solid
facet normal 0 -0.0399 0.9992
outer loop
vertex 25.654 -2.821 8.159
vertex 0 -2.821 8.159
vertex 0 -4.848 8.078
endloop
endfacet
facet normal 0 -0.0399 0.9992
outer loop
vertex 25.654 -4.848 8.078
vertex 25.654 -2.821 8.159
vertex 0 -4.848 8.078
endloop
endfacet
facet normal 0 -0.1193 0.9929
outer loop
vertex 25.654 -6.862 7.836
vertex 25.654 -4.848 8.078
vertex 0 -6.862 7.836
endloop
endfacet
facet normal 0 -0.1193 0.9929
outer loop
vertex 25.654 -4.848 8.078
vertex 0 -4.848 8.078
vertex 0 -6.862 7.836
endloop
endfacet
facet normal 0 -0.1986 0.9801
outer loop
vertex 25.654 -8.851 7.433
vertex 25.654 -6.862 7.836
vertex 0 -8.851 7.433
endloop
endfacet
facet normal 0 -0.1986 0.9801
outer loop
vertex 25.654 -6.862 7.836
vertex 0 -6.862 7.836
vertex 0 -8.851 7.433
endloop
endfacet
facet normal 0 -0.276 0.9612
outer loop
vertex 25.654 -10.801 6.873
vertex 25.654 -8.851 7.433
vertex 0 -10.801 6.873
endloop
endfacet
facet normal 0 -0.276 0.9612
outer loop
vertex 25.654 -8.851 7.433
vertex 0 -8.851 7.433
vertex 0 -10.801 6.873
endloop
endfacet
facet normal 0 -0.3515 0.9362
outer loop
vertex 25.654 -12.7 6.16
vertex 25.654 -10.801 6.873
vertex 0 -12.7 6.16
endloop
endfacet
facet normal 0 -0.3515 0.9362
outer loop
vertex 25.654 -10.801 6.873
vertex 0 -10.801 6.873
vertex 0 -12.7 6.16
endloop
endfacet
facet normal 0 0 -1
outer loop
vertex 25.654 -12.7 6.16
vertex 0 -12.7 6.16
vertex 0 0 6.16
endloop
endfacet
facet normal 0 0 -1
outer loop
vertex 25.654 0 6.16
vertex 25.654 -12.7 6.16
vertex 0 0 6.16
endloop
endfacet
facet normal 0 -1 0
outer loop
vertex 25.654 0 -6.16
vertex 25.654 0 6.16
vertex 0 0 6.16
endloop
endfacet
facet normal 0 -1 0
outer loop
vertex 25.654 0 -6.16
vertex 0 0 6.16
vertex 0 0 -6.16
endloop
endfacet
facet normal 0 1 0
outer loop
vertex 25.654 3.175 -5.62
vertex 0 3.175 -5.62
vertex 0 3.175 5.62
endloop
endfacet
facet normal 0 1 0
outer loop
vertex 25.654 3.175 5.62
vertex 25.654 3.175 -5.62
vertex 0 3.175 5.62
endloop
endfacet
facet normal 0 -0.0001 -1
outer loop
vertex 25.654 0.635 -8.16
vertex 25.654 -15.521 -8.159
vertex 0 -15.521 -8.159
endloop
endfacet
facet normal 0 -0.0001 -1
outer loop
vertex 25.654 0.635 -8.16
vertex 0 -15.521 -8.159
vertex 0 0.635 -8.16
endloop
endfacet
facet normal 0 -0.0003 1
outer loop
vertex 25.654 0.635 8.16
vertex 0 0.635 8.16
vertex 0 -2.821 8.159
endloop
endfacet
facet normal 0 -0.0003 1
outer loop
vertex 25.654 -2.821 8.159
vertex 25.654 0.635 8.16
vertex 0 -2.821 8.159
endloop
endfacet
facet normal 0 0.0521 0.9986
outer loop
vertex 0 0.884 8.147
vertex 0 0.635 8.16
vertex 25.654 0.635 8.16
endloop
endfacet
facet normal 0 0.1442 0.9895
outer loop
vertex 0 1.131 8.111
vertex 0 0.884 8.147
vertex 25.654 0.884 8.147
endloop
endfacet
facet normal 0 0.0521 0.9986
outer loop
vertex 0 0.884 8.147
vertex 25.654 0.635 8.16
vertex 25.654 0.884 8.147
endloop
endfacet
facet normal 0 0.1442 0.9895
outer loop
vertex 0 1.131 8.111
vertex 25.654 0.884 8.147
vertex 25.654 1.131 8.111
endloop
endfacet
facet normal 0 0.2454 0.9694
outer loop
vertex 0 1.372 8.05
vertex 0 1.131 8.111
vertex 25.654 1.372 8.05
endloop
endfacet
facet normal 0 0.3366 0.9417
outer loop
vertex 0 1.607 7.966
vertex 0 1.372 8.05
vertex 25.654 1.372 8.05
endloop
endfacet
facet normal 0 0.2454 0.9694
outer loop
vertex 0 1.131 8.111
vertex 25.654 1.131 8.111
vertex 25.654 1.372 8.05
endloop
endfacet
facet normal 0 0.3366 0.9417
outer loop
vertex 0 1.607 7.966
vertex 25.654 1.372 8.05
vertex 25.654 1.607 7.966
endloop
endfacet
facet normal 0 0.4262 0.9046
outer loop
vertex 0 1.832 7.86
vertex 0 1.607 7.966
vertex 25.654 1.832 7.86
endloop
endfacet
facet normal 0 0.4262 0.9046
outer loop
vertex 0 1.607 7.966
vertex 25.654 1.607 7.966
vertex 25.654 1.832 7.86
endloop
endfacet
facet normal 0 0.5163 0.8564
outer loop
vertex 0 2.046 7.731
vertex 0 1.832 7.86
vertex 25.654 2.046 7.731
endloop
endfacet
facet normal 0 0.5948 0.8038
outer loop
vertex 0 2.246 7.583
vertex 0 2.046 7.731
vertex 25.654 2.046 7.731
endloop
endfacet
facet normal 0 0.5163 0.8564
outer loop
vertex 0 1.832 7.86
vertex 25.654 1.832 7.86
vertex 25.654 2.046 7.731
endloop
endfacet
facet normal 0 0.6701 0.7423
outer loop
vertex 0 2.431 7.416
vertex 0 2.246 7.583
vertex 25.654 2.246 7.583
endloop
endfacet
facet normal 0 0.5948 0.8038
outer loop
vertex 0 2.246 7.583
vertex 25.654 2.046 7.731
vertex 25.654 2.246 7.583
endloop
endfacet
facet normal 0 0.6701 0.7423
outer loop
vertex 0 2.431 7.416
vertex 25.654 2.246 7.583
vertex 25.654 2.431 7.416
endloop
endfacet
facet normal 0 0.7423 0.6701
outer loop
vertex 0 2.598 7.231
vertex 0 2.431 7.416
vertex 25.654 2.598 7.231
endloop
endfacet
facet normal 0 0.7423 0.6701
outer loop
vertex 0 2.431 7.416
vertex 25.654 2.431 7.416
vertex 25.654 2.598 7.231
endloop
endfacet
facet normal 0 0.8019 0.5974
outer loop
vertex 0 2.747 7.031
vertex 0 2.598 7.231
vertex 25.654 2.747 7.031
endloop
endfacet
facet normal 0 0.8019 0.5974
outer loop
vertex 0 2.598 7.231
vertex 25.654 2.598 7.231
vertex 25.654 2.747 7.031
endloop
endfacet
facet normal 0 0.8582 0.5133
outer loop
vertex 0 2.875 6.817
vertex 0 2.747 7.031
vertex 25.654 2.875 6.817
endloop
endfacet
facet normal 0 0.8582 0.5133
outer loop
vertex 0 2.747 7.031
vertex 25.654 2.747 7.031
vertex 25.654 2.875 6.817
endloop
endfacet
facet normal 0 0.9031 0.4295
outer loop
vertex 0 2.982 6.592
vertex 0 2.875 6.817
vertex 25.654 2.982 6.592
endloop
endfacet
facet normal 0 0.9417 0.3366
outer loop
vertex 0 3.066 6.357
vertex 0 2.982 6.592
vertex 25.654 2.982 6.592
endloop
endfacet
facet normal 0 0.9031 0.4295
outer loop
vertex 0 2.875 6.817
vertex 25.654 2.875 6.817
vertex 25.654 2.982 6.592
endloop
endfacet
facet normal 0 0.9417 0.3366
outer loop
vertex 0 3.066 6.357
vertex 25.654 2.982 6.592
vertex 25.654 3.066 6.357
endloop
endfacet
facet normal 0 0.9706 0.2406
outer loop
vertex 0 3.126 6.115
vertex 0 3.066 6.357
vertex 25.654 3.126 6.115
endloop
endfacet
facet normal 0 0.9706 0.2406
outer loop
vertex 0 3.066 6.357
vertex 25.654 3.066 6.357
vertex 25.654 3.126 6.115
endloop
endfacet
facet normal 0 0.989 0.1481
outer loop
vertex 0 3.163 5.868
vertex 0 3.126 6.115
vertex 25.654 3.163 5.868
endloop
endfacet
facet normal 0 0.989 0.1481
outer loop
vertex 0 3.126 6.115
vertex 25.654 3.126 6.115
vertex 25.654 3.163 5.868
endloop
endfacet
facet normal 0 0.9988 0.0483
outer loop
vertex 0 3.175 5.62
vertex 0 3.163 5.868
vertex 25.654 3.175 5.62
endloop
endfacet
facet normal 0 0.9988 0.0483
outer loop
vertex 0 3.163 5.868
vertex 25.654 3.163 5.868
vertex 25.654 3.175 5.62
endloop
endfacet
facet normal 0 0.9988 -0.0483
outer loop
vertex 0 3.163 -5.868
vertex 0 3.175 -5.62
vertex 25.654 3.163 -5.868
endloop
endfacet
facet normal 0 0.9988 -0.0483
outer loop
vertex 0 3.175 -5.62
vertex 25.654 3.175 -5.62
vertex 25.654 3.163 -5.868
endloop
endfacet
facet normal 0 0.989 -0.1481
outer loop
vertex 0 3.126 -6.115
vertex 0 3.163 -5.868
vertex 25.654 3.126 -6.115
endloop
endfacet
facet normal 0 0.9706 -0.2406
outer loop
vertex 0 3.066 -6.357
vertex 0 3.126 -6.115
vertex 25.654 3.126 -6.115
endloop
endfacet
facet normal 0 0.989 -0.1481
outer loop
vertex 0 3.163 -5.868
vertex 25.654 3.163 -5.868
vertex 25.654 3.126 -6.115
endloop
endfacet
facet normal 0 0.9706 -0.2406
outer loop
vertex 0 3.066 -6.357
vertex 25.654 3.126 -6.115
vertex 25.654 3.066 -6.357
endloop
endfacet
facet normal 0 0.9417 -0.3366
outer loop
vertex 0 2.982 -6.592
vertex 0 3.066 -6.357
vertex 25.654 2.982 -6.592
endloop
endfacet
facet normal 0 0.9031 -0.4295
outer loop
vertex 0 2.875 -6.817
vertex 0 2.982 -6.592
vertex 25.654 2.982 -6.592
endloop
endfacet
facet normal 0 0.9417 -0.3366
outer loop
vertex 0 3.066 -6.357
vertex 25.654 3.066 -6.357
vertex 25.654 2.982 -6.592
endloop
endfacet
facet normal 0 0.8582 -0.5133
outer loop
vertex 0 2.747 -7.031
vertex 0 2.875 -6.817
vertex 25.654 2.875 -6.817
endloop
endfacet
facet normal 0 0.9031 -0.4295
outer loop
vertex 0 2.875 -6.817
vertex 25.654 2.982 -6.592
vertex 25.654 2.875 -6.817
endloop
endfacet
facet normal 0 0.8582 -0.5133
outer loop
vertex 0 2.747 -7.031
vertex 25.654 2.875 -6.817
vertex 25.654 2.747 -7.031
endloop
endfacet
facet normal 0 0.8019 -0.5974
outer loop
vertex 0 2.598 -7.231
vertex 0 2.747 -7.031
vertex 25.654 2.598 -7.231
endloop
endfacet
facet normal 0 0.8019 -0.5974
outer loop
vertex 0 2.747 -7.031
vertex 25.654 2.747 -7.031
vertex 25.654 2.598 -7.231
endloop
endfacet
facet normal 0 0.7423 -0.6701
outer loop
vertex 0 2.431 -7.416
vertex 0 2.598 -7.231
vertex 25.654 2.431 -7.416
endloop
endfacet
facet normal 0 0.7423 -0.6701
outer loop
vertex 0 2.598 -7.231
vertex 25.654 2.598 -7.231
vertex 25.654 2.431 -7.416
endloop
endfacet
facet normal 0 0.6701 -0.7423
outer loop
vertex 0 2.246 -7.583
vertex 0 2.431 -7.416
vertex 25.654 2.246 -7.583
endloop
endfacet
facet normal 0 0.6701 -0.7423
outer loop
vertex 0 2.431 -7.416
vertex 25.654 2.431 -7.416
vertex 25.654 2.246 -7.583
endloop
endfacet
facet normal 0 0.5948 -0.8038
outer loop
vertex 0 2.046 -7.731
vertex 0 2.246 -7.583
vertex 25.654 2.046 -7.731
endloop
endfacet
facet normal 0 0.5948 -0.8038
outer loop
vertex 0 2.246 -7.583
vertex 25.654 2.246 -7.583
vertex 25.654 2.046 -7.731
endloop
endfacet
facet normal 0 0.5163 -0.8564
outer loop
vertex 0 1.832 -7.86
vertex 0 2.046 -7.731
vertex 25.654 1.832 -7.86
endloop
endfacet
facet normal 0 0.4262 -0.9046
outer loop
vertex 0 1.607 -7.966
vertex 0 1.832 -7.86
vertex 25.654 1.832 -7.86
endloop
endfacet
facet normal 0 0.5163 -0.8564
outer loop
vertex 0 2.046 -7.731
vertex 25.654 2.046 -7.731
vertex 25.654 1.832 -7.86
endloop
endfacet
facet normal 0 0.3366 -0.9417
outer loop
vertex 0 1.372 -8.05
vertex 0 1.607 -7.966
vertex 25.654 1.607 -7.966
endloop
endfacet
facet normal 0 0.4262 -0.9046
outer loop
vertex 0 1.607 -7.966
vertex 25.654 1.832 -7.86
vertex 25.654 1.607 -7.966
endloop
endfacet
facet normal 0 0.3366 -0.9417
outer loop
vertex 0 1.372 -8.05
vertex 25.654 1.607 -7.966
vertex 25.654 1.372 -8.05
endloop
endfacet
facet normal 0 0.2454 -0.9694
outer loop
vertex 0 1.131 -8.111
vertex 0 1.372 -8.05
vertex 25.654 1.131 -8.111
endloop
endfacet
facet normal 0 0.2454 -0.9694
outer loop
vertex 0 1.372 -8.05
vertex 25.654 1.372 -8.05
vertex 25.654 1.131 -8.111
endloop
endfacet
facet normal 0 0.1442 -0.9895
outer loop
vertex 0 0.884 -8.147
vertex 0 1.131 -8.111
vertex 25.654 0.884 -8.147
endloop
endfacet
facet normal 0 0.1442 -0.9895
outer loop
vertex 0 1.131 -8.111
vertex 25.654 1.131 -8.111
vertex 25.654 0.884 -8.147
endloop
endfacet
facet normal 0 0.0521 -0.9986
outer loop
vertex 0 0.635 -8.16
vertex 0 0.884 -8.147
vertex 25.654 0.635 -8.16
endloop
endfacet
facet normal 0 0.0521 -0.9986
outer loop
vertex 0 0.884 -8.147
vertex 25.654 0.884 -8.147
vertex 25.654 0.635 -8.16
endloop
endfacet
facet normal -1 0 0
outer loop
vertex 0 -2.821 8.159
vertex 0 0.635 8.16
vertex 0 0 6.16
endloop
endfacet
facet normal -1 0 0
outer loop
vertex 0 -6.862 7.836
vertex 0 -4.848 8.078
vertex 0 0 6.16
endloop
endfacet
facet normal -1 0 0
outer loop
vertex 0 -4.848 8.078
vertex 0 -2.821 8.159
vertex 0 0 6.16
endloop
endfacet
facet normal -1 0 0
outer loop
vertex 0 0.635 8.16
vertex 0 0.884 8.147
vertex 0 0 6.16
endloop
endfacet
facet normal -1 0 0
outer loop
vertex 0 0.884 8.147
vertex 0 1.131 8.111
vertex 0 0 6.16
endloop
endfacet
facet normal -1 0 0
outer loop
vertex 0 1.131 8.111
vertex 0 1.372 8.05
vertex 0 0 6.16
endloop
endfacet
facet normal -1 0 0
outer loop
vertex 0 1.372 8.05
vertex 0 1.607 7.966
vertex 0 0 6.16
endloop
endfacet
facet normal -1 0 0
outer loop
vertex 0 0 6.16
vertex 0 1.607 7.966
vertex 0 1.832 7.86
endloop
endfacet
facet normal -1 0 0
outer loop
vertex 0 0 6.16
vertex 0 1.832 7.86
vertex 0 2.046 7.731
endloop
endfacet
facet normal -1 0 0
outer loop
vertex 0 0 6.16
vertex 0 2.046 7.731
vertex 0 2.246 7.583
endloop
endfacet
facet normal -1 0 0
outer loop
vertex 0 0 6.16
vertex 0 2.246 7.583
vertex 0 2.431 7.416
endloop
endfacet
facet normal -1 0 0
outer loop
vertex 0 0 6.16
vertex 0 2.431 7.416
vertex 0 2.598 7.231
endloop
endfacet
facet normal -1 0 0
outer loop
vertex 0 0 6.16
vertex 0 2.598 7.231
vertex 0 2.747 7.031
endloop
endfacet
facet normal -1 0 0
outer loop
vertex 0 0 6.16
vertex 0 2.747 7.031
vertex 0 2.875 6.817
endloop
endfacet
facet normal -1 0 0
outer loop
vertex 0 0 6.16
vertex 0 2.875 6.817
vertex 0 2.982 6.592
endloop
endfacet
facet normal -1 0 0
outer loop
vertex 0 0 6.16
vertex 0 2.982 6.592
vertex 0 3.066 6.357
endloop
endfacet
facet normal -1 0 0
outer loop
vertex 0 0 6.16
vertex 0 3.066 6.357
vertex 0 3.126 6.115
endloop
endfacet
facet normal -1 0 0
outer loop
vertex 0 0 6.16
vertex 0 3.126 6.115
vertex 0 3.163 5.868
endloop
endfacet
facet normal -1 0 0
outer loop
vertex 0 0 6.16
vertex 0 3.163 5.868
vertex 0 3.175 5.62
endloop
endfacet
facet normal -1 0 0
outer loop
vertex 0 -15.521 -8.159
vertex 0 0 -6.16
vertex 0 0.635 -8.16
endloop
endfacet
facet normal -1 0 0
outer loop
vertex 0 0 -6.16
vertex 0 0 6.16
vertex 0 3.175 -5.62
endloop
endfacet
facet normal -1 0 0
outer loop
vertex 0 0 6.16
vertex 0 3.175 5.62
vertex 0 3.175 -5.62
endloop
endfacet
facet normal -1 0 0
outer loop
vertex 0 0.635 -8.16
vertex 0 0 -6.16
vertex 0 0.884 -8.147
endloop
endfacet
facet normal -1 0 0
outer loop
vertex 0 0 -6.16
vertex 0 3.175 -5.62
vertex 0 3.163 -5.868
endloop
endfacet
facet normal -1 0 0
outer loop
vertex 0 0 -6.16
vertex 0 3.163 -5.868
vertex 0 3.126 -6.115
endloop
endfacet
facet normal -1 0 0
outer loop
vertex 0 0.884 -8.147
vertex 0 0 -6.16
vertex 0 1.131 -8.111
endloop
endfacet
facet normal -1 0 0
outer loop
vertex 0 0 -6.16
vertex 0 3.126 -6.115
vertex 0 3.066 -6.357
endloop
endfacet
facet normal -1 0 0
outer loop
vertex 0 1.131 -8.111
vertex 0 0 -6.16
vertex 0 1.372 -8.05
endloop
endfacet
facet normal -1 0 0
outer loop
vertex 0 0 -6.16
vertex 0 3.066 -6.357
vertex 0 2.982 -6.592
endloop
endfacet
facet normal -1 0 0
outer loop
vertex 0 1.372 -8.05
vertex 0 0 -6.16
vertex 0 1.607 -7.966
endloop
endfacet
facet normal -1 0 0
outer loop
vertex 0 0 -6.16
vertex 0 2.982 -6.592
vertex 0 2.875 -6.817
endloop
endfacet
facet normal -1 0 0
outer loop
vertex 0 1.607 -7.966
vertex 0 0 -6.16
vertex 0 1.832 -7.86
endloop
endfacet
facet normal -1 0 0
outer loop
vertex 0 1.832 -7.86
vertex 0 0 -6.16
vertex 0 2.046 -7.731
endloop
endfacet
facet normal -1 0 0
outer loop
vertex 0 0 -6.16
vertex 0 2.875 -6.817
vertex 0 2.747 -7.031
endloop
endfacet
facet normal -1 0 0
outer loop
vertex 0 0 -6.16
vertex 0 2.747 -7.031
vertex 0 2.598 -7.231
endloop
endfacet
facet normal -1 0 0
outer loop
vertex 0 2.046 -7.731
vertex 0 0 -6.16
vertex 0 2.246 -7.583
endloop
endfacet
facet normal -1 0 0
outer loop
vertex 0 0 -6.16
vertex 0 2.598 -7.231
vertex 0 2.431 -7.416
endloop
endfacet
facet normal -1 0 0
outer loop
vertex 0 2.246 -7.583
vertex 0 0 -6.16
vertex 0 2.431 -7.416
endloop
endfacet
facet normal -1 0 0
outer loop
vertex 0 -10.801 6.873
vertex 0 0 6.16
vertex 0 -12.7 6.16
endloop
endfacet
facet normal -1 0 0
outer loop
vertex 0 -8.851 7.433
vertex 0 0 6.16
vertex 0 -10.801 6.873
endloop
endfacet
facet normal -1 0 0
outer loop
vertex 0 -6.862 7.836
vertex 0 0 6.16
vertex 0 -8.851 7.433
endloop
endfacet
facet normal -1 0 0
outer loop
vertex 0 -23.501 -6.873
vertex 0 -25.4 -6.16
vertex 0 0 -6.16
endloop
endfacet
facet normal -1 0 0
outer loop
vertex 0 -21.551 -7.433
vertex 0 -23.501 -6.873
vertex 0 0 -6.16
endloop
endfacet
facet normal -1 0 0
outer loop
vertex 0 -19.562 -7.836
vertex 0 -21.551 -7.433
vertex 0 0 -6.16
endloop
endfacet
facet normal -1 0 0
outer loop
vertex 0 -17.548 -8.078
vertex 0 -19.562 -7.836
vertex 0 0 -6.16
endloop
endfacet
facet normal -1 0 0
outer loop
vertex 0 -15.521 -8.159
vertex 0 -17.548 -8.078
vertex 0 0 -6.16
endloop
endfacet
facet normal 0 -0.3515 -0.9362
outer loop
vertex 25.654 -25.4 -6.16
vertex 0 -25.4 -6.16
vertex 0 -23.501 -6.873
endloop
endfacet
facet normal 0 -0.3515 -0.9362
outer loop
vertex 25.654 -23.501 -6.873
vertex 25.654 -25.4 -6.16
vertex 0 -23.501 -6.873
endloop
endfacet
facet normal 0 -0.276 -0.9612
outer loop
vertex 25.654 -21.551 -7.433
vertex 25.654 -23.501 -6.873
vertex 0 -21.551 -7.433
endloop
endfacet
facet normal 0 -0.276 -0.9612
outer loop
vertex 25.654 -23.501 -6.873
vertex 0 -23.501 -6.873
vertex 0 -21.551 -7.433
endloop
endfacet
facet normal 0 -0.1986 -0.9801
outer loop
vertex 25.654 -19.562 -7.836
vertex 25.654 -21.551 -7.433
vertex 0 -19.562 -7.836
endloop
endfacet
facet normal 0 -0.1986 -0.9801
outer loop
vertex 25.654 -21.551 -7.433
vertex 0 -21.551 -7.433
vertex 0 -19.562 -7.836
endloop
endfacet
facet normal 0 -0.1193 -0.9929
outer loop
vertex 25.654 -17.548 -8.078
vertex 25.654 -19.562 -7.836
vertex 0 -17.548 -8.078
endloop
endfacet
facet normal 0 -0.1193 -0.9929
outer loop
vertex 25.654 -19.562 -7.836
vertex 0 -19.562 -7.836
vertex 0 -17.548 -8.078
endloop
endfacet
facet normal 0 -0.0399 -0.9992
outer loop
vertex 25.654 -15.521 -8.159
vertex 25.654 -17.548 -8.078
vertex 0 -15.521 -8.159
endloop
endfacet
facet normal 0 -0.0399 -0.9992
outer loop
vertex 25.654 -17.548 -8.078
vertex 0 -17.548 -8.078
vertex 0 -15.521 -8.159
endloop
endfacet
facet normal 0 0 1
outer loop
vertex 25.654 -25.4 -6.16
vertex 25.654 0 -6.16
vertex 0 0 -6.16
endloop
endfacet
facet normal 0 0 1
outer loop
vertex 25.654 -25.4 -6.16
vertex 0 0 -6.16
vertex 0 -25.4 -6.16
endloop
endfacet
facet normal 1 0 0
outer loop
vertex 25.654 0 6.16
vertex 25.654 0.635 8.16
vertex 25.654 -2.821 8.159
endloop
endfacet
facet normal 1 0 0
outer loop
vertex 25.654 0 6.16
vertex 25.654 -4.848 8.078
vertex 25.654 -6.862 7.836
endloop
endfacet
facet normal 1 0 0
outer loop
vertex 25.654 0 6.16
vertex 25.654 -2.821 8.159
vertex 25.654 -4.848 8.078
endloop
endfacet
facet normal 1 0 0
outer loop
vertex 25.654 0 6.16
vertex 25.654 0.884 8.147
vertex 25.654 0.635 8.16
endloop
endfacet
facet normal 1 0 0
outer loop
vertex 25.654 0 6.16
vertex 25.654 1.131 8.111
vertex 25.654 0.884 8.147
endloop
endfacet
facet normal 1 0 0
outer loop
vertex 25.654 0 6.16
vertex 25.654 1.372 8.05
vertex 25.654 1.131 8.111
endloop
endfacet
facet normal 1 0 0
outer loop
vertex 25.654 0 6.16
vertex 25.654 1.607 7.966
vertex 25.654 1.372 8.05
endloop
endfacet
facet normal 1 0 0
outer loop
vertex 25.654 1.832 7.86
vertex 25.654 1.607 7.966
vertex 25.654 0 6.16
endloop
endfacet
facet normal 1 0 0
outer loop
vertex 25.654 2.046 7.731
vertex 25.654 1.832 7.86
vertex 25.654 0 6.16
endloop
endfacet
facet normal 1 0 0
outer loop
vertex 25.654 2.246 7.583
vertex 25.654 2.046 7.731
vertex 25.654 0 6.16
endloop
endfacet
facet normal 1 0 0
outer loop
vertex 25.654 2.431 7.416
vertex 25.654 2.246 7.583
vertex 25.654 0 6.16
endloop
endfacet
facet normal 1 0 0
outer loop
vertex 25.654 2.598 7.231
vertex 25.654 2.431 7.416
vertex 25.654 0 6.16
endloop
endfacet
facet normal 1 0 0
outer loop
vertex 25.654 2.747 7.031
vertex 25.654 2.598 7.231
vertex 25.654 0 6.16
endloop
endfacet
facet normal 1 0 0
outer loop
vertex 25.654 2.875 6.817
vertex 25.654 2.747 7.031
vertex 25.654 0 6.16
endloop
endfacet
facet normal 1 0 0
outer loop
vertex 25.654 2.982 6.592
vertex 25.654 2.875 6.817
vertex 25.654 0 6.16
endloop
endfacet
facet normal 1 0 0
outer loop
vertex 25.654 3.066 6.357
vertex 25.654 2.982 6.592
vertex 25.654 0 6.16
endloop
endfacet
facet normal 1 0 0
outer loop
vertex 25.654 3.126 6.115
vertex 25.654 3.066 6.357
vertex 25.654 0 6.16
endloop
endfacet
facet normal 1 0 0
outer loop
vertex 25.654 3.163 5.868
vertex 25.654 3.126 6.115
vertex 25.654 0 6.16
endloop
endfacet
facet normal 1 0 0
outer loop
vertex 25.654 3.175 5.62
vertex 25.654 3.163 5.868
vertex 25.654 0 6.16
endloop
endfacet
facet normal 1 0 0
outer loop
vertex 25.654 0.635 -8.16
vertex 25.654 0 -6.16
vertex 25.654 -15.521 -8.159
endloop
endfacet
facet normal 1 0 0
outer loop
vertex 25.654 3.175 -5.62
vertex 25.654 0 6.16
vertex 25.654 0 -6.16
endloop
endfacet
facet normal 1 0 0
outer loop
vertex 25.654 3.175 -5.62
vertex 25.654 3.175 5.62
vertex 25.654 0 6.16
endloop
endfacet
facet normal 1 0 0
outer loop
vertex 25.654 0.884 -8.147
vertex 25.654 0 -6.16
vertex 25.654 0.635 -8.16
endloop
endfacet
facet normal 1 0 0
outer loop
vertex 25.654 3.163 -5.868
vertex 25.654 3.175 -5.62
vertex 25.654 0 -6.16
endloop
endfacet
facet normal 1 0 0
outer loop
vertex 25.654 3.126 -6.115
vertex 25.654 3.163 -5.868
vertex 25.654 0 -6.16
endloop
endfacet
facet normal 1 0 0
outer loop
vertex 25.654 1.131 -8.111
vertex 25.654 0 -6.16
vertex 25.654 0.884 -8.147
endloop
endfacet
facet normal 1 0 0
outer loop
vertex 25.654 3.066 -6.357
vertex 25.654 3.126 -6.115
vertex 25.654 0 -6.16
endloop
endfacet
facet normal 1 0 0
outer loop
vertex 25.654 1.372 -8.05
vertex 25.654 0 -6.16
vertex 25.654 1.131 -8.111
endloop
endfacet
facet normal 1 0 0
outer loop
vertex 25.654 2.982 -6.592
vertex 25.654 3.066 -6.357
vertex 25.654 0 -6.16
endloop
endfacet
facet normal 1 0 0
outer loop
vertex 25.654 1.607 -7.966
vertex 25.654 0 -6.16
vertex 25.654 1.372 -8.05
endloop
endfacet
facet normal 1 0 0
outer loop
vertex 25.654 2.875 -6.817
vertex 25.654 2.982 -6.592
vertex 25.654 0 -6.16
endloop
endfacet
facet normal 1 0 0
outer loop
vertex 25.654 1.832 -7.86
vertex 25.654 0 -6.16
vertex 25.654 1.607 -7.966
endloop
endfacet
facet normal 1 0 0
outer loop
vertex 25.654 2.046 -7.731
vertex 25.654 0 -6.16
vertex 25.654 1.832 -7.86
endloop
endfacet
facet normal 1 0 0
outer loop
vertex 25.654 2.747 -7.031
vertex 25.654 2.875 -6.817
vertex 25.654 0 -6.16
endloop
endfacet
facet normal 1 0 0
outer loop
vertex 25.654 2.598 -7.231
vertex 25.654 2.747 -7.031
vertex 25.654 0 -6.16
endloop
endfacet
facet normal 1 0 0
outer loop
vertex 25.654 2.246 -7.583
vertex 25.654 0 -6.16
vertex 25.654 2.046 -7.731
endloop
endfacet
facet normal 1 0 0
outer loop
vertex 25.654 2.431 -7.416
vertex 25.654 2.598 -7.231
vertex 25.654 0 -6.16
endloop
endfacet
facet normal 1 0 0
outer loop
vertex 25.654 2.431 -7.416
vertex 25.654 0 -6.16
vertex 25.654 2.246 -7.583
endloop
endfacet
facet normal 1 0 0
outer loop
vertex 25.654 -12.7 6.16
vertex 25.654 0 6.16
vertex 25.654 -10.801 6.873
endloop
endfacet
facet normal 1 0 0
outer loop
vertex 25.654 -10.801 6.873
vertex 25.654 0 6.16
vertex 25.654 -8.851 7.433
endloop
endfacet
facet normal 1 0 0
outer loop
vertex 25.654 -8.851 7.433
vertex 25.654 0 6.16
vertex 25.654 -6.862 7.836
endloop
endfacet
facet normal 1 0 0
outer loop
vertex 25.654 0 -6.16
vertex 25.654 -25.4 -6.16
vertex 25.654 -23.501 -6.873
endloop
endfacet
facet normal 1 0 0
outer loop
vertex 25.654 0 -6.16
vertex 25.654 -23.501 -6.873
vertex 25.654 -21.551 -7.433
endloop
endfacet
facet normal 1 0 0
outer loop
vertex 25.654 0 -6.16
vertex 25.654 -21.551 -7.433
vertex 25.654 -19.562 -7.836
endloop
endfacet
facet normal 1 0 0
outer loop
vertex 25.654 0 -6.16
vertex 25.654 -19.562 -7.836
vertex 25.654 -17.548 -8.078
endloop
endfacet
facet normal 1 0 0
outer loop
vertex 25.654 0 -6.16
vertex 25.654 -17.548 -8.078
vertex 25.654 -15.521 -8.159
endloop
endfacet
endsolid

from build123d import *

# Parameters (mm, degrees)
BOSS_EXTRUDE1_DEPTH = 25.654
FILLET1_R           = 25.4
FILLET2_R           = 2.54


with BuildPart() as part:
    # Sketch1 → Boss-Extrude1 (new body)
    with BuildSketch(Plane(origin=(0, 0, 0), x_dir=(0, 0, -1), z_dir=(1, 0, 0))):
        Polygon((-8.1595, -12.7), (-6.1595, -12.7), (-6.1595, 0), (6.1595, 0), (6.1595, -25.4), (8.1595, -25.4), (8.1595, 3.175), (-8.1595, 3.175), align=None)
    extrude(amount=BOSS_EXTRUDE1_DEPTH)

    # Fillet1
    # the kernel refuses this fillet: 25.4 mm, written as the material it takes off along each edge
    with BuildSketch(Plane(origin=(-24.69817807, -12.7, 8.1595), x_dir=(0, 0, -1), z_dir=(1, 0, 0))) as fillet1_piece_1:
        with BuildLine():
            CenterArc((25.4, 9.879271228), FILLET1_R, 180, 22.889037196)
            Line((0, 9.879271228), (-0.508, 9.879271228))
            Line((-0.508, 9.879271228), (-0.508, 0))
            Line((-0.508, 0), (0, -0.508))
            ThreePointArc((0, -0.508), (1, -0.508), (1.532, -0.197585425))
            Line((1.532, -0.197585425), (2, 0))
        make_face()
    extrude(amount=75.050356141, mode=Mode.SUBTRACT)
    with BuildSketch(Plane(origin=(-24.69817807, -25.4, -8.1595), x_dir=(0, 0, 1), z_dir=(1, 0, 0))) as fillet1_piece_2:
        with BuildLine():
            CenterArc((25.4, -9.879271228), FILLET1_R, 157.110962804, 22.889037196)
            Line((0, -9.879271228), (-0.508, -9.879271228))
            Line((-0.508, -9.879271228), (-0.508, 0))
            Line((-0.508, 0), (0, 0.508))
            ThreePointArc((0, 0.508), (1, 0.508), (1.532, 0.197585425))
            Line((1.532, 0.197585425), (2, 0))
        make_face()
    extrude(amount=75.050356141, mode=Mode.SUBTRACT)

    # Fillet2
    fillet2_edges = [part.edges().sort_by_distance(p)[0] for p in [
        (12.827, 3.175, 8.1595),
        (12.827, 3.175, -8.1595),
    ]]
    fillet(fillet2_edges, radius=FILLET2_R)


solid = part.part
